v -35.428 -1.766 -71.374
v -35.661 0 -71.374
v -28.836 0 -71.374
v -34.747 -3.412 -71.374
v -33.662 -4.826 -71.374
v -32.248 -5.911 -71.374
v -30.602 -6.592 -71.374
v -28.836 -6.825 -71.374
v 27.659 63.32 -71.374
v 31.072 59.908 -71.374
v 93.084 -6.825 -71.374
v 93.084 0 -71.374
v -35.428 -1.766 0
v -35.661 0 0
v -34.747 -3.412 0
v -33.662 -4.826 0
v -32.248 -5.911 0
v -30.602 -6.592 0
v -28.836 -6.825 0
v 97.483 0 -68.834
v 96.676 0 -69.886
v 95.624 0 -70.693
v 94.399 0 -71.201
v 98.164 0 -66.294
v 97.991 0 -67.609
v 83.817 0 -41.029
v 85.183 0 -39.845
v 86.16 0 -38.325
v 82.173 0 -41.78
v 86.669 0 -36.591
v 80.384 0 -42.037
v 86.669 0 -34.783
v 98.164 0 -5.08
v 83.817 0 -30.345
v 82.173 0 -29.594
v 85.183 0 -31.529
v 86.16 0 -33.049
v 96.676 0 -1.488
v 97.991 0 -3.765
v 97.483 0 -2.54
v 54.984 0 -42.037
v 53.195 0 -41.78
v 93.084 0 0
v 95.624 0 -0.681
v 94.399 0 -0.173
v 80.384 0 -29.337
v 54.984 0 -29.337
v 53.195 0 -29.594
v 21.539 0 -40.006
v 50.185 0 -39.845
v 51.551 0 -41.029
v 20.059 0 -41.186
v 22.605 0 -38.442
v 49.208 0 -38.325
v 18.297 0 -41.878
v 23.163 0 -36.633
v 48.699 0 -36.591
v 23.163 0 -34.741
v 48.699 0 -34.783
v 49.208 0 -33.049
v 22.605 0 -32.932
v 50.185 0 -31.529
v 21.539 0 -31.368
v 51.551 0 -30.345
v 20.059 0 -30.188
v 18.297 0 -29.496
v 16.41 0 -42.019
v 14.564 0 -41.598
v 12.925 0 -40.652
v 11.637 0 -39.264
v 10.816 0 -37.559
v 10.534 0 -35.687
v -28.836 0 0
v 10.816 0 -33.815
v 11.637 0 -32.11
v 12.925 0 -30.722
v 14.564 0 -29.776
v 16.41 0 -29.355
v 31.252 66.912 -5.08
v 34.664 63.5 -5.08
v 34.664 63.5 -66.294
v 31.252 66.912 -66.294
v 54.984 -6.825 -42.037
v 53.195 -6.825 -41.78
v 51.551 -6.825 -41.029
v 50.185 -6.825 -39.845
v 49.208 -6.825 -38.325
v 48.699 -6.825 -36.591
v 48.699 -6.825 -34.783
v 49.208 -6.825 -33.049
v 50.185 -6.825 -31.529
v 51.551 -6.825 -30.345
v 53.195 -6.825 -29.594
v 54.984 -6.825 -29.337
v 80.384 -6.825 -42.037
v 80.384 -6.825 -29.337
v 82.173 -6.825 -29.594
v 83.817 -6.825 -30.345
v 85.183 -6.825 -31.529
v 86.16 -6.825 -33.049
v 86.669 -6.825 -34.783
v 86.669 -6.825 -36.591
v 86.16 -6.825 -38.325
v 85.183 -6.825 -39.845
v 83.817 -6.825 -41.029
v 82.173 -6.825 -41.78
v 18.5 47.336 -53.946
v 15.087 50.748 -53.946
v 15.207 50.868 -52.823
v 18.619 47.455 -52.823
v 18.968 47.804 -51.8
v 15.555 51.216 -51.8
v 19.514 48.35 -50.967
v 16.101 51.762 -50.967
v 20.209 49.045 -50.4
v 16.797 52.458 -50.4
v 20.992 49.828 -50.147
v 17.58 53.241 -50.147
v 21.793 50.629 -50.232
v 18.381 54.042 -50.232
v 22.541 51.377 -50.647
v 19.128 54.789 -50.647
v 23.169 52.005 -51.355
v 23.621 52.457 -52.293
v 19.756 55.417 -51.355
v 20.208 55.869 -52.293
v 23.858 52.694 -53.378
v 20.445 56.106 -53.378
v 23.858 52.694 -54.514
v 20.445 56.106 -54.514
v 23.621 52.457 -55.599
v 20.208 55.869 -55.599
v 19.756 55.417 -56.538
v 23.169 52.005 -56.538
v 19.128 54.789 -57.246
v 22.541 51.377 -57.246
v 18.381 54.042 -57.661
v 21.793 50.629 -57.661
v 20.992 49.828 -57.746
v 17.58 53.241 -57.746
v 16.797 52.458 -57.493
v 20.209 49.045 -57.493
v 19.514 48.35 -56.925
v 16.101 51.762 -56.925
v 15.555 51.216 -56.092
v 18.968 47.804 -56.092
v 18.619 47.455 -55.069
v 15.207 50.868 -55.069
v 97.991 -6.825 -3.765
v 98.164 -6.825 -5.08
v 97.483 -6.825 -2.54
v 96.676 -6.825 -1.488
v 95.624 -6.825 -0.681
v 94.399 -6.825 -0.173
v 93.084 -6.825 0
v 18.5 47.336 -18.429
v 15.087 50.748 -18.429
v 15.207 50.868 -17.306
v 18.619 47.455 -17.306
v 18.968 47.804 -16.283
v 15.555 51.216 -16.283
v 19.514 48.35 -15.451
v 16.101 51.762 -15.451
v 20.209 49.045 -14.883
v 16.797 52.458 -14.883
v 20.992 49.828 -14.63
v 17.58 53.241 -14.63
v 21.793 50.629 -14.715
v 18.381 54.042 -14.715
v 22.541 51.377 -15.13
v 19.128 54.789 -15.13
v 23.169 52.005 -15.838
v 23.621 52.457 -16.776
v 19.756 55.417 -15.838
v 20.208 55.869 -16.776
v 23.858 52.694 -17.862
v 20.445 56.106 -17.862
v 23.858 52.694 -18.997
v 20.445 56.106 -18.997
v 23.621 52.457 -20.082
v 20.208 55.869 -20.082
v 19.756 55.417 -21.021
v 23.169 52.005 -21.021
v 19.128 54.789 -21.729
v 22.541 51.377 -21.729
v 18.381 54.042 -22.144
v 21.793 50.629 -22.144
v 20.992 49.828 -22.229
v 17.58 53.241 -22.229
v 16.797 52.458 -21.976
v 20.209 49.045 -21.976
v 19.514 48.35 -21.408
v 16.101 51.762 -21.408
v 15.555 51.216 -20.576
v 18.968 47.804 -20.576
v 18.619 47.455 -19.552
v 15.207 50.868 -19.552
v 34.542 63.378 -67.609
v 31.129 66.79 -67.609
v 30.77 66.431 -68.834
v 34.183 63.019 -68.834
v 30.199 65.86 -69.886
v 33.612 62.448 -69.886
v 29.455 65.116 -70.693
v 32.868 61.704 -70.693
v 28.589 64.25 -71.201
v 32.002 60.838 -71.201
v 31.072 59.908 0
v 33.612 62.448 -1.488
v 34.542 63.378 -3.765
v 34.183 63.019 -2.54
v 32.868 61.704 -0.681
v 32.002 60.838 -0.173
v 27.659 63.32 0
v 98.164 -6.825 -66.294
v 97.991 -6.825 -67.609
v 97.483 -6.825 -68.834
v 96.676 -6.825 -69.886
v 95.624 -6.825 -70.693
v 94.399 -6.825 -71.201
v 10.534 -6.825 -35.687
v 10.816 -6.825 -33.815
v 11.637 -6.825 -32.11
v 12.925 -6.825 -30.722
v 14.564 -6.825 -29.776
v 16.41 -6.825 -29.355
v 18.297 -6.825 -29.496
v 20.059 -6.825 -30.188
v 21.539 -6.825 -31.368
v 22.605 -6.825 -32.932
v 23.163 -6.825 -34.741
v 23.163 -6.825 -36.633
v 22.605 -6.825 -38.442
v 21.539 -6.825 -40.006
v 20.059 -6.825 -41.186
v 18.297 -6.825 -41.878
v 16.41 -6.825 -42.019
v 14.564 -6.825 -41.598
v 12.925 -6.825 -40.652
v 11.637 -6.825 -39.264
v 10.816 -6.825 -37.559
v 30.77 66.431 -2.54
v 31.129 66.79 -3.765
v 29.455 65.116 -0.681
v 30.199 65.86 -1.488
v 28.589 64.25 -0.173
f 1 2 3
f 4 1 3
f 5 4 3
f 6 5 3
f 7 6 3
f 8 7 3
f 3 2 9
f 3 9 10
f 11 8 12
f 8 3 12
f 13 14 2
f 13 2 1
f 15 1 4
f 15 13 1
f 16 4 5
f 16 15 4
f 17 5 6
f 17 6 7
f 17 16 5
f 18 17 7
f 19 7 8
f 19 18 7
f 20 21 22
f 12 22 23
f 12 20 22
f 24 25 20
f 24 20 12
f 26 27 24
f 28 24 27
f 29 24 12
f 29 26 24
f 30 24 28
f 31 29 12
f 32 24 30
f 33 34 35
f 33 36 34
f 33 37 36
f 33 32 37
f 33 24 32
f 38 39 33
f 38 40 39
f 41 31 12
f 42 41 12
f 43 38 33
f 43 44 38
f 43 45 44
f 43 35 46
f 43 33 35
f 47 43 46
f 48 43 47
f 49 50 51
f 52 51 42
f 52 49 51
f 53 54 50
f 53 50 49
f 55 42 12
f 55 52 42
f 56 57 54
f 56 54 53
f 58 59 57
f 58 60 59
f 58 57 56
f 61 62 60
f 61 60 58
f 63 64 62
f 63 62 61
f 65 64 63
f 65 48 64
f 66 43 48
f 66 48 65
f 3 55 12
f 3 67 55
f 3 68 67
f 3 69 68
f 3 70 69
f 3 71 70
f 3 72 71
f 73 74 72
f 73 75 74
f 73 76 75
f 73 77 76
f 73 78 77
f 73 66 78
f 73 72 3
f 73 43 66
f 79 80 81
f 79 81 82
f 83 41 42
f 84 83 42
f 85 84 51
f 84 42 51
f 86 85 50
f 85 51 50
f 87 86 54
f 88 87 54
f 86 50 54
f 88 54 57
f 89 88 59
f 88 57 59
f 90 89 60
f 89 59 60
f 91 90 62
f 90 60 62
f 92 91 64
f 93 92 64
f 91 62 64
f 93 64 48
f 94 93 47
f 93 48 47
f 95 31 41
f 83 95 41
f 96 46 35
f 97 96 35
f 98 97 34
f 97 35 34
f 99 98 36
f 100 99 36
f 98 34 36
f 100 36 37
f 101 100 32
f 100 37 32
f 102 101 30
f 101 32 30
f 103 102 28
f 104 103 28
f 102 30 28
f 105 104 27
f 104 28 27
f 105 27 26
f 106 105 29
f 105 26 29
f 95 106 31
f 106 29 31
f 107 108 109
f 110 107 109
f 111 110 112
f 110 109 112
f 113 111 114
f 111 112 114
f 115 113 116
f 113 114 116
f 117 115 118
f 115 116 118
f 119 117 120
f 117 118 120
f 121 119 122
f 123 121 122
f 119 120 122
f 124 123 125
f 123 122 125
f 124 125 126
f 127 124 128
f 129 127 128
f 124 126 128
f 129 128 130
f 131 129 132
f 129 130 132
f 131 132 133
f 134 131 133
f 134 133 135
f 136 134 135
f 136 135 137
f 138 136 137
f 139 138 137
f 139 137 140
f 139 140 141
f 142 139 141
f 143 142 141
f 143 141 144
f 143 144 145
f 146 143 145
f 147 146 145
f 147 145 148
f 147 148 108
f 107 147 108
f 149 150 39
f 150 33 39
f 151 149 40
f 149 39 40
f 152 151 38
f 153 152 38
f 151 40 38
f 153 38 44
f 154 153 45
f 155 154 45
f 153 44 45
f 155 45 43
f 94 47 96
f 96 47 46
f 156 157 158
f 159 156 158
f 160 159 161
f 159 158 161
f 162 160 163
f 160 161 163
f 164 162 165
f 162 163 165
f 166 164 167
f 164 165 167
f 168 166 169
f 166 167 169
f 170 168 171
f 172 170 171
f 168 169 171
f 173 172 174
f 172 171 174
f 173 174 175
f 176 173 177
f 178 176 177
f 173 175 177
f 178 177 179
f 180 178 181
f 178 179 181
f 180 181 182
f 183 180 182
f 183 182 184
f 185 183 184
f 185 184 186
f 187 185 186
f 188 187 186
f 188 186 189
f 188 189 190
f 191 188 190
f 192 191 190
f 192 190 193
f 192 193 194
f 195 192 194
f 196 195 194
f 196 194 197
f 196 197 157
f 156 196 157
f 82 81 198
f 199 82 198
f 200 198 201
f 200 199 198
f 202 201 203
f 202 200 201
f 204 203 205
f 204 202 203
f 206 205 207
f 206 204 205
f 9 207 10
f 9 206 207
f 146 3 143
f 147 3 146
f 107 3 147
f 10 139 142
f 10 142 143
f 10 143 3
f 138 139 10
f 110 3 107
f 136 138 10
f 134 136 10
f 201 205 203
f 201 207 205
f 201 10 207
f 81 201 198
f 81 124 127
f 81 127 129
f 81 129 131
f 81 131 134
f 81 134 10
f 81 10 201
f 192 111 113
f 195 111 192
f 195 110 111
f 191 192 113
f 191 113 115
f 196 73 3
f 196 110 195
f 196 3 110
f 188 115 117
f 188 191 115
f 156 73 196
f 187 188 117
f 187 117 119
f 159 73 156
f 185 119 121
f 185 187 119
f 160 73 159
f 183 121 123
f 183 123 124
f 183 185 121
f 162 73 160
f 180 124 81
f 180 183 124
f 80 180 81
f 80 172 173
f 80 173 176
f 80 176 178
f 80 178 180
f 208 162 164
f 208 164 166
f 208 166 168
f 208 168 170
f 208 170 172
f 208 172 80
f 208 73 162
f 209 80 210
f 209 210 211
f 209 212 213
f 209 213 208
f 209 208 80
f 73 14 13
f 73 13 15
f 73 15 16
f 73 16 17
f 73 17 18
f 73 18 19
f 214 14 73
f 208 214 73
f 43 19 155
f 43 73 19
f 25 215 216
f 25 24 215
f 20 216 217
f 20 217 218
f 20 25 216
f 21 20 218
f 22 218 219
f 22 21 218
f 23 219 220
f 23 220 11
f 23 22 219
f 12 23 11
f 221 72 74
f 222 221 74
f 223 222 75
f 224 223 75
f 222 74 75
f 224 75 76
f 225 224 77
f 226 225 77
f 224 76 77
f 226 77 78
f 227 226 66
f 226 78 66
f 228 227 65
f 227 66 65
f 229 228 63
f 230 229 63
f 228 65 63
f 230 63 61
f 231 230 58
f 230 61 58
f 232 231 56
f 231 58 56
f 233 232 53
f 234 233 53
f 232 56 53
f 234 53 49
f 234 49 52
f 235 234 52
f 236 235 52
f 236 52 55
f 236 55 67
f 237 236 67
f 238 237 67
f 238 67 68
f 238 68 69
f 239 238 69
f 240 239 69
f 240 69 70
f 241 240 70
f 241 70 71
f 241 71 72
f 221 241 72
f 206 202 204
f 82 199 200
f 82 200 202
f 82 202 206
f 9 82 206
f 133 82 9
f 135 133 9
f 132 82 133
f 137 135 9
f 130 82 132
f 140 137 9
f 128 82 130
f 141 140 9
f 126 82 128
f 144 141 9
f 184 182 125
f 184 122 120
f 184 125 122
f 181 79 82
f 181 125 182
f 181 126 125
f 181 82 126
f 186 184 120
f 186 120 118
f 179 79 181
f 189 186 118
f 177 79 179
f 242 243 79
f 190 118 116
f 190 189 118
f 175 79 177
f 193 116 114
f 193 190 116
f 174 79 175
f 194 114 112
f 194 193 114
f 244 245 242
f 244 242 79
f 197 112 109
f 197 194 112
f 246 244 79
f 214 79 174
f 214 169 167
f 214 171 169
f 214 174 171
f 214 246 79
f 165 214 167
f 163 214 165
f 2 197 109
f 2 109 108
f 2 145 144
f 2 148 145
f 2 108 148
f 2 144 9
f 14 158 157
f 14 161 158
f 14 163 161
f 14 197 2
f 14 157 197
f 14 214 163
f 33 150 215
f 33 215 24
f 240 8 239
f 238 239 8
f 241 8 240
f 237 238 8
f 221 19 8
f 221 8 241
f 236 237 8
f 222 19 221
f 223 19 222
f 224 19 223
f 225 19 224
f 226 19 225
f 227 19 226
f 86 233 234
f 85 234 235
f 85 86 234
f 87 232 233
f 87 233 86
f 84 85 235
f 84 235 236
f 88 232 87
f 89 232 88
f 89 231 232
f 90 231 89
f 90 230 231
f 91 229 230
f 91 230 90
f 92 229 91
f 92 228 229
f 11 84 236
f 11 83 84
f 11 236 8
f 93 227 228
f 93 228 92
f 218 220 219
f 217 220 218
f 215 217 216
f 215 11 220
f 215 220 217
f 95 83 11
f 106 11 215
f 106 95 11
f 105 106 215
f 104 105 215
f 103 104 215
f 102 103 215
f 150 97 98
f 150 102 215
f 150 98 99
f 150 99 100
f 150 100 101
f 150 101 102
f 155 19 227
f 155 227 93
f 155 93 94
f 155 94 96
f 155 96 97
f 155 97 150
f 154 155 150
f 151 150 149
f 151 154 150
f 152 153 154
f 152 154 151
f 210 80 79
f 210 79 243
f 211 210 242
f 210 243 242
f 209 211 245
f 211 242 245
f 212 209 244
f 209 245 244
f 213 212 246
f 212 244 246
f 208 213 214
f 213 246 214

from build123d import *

# Parameters (mm, degrees)
F1_DEPTH = 71.374
F2_R     = 5.08
F3_R     = 6.35
F4_DEPTH = 25.4
F5_DEPTH = 25.4
F6_R     = 3.81
F7_DEPTH = 25.4


with BuildPart() as f1:
    # F0 (on Top) → F1 (new body)
    with BuildSketch(Plane.XY):
        with BuildLine():
            Line((98.164037795, 0), (0, 0))
            Line((0, 0), (-28.835962205, 0))
            Line((-28.835962205, 0), (34.664037795, 63.5))
            Line((34.664037795, 63.5), (31.251540469, 66.912497326))
            Line((31.251540469, 66.912497326), (-35.660956857, 0))
            ThreePointArc((-35.660956857, 0), (-33.661962205, -4.826), (-28.835962205, -6.824994652))
            Line((-28.835962205, -6.824994652), (98.164037795, -6.824994652))
            Line((98.164037795, -6.824994652), (98.164037795, 0))
        make_face()
    extrude(amount=-F1_DEPTH)

    # F2
    f2_edges = [f1.edges().sort_by_distance(p)[0] for p in [
        (32.957789, 65.206249, 0),
        (32.957789, 65.206249, -71.374),
        (98.164038, -3.412497, 0),
        (98.164038, -3.412497, -71.374),
    ]]
    fillet(f2_edges, radius=F2_R)

    # F3 (on face) → F4 (cut)
    with BuildSketch(Plane(origin=(0, 0, 0), x_dir=(-1, 0, 0), z_dir=(0, 1, 0))):
        with Locations((-16.884037795, -35.687)):
            Circle(F3_R)
    extrude(amount=-F4_DEPTH, mode=Mode.SUBTRACT)

    # F3 (on face) → F5 (cut)
    with BuildSketch(Plane(origin=(0, 0, 0), x_dir=(-1, 0, 0), z_dir=(0, 1, 0))):
        with Locations((-16.884037795, -35.687)):
            Circle(F3_R)
        with BuildLine():
            ThreePointArc((-54.984037795, -42.037), (-48.634037795, -35.687), (-54.984037795, -29.337))
            Line((-54.984037795, -29.337), (-80.384037795, -29.337))
            ThreePointArc((-80.384037795, -29.337), (-86.734037795, -35.687), (-80.384037795, -42.037))
            Line((-80.384037795, -42.037), (-54.984037795, -42.037))
        make_face()
    extrude(amount=-F5_DEPTH, mode=Mode.SUBTRACT)

    # F6 (on face) → F7 (cut)
    with BuildSketch(Plane(origin=(-17.8304784285, 17.8304784285, 0), x_dir=(-0.7071067812, -0.7071067812, 0), z_dir=(-0.7071067812, 0.7071067812, 0))):
        with Locations((-50.3624567935, -53.9462038157)):
            Circle(F6_R)
        with Locations((-50.3624567935, -18.4293880287)):
            Circle(F6_R)
    extrude(amount=-F7_DEPTH, mode=Mode.SUBTRACT)


solid = f1.part
